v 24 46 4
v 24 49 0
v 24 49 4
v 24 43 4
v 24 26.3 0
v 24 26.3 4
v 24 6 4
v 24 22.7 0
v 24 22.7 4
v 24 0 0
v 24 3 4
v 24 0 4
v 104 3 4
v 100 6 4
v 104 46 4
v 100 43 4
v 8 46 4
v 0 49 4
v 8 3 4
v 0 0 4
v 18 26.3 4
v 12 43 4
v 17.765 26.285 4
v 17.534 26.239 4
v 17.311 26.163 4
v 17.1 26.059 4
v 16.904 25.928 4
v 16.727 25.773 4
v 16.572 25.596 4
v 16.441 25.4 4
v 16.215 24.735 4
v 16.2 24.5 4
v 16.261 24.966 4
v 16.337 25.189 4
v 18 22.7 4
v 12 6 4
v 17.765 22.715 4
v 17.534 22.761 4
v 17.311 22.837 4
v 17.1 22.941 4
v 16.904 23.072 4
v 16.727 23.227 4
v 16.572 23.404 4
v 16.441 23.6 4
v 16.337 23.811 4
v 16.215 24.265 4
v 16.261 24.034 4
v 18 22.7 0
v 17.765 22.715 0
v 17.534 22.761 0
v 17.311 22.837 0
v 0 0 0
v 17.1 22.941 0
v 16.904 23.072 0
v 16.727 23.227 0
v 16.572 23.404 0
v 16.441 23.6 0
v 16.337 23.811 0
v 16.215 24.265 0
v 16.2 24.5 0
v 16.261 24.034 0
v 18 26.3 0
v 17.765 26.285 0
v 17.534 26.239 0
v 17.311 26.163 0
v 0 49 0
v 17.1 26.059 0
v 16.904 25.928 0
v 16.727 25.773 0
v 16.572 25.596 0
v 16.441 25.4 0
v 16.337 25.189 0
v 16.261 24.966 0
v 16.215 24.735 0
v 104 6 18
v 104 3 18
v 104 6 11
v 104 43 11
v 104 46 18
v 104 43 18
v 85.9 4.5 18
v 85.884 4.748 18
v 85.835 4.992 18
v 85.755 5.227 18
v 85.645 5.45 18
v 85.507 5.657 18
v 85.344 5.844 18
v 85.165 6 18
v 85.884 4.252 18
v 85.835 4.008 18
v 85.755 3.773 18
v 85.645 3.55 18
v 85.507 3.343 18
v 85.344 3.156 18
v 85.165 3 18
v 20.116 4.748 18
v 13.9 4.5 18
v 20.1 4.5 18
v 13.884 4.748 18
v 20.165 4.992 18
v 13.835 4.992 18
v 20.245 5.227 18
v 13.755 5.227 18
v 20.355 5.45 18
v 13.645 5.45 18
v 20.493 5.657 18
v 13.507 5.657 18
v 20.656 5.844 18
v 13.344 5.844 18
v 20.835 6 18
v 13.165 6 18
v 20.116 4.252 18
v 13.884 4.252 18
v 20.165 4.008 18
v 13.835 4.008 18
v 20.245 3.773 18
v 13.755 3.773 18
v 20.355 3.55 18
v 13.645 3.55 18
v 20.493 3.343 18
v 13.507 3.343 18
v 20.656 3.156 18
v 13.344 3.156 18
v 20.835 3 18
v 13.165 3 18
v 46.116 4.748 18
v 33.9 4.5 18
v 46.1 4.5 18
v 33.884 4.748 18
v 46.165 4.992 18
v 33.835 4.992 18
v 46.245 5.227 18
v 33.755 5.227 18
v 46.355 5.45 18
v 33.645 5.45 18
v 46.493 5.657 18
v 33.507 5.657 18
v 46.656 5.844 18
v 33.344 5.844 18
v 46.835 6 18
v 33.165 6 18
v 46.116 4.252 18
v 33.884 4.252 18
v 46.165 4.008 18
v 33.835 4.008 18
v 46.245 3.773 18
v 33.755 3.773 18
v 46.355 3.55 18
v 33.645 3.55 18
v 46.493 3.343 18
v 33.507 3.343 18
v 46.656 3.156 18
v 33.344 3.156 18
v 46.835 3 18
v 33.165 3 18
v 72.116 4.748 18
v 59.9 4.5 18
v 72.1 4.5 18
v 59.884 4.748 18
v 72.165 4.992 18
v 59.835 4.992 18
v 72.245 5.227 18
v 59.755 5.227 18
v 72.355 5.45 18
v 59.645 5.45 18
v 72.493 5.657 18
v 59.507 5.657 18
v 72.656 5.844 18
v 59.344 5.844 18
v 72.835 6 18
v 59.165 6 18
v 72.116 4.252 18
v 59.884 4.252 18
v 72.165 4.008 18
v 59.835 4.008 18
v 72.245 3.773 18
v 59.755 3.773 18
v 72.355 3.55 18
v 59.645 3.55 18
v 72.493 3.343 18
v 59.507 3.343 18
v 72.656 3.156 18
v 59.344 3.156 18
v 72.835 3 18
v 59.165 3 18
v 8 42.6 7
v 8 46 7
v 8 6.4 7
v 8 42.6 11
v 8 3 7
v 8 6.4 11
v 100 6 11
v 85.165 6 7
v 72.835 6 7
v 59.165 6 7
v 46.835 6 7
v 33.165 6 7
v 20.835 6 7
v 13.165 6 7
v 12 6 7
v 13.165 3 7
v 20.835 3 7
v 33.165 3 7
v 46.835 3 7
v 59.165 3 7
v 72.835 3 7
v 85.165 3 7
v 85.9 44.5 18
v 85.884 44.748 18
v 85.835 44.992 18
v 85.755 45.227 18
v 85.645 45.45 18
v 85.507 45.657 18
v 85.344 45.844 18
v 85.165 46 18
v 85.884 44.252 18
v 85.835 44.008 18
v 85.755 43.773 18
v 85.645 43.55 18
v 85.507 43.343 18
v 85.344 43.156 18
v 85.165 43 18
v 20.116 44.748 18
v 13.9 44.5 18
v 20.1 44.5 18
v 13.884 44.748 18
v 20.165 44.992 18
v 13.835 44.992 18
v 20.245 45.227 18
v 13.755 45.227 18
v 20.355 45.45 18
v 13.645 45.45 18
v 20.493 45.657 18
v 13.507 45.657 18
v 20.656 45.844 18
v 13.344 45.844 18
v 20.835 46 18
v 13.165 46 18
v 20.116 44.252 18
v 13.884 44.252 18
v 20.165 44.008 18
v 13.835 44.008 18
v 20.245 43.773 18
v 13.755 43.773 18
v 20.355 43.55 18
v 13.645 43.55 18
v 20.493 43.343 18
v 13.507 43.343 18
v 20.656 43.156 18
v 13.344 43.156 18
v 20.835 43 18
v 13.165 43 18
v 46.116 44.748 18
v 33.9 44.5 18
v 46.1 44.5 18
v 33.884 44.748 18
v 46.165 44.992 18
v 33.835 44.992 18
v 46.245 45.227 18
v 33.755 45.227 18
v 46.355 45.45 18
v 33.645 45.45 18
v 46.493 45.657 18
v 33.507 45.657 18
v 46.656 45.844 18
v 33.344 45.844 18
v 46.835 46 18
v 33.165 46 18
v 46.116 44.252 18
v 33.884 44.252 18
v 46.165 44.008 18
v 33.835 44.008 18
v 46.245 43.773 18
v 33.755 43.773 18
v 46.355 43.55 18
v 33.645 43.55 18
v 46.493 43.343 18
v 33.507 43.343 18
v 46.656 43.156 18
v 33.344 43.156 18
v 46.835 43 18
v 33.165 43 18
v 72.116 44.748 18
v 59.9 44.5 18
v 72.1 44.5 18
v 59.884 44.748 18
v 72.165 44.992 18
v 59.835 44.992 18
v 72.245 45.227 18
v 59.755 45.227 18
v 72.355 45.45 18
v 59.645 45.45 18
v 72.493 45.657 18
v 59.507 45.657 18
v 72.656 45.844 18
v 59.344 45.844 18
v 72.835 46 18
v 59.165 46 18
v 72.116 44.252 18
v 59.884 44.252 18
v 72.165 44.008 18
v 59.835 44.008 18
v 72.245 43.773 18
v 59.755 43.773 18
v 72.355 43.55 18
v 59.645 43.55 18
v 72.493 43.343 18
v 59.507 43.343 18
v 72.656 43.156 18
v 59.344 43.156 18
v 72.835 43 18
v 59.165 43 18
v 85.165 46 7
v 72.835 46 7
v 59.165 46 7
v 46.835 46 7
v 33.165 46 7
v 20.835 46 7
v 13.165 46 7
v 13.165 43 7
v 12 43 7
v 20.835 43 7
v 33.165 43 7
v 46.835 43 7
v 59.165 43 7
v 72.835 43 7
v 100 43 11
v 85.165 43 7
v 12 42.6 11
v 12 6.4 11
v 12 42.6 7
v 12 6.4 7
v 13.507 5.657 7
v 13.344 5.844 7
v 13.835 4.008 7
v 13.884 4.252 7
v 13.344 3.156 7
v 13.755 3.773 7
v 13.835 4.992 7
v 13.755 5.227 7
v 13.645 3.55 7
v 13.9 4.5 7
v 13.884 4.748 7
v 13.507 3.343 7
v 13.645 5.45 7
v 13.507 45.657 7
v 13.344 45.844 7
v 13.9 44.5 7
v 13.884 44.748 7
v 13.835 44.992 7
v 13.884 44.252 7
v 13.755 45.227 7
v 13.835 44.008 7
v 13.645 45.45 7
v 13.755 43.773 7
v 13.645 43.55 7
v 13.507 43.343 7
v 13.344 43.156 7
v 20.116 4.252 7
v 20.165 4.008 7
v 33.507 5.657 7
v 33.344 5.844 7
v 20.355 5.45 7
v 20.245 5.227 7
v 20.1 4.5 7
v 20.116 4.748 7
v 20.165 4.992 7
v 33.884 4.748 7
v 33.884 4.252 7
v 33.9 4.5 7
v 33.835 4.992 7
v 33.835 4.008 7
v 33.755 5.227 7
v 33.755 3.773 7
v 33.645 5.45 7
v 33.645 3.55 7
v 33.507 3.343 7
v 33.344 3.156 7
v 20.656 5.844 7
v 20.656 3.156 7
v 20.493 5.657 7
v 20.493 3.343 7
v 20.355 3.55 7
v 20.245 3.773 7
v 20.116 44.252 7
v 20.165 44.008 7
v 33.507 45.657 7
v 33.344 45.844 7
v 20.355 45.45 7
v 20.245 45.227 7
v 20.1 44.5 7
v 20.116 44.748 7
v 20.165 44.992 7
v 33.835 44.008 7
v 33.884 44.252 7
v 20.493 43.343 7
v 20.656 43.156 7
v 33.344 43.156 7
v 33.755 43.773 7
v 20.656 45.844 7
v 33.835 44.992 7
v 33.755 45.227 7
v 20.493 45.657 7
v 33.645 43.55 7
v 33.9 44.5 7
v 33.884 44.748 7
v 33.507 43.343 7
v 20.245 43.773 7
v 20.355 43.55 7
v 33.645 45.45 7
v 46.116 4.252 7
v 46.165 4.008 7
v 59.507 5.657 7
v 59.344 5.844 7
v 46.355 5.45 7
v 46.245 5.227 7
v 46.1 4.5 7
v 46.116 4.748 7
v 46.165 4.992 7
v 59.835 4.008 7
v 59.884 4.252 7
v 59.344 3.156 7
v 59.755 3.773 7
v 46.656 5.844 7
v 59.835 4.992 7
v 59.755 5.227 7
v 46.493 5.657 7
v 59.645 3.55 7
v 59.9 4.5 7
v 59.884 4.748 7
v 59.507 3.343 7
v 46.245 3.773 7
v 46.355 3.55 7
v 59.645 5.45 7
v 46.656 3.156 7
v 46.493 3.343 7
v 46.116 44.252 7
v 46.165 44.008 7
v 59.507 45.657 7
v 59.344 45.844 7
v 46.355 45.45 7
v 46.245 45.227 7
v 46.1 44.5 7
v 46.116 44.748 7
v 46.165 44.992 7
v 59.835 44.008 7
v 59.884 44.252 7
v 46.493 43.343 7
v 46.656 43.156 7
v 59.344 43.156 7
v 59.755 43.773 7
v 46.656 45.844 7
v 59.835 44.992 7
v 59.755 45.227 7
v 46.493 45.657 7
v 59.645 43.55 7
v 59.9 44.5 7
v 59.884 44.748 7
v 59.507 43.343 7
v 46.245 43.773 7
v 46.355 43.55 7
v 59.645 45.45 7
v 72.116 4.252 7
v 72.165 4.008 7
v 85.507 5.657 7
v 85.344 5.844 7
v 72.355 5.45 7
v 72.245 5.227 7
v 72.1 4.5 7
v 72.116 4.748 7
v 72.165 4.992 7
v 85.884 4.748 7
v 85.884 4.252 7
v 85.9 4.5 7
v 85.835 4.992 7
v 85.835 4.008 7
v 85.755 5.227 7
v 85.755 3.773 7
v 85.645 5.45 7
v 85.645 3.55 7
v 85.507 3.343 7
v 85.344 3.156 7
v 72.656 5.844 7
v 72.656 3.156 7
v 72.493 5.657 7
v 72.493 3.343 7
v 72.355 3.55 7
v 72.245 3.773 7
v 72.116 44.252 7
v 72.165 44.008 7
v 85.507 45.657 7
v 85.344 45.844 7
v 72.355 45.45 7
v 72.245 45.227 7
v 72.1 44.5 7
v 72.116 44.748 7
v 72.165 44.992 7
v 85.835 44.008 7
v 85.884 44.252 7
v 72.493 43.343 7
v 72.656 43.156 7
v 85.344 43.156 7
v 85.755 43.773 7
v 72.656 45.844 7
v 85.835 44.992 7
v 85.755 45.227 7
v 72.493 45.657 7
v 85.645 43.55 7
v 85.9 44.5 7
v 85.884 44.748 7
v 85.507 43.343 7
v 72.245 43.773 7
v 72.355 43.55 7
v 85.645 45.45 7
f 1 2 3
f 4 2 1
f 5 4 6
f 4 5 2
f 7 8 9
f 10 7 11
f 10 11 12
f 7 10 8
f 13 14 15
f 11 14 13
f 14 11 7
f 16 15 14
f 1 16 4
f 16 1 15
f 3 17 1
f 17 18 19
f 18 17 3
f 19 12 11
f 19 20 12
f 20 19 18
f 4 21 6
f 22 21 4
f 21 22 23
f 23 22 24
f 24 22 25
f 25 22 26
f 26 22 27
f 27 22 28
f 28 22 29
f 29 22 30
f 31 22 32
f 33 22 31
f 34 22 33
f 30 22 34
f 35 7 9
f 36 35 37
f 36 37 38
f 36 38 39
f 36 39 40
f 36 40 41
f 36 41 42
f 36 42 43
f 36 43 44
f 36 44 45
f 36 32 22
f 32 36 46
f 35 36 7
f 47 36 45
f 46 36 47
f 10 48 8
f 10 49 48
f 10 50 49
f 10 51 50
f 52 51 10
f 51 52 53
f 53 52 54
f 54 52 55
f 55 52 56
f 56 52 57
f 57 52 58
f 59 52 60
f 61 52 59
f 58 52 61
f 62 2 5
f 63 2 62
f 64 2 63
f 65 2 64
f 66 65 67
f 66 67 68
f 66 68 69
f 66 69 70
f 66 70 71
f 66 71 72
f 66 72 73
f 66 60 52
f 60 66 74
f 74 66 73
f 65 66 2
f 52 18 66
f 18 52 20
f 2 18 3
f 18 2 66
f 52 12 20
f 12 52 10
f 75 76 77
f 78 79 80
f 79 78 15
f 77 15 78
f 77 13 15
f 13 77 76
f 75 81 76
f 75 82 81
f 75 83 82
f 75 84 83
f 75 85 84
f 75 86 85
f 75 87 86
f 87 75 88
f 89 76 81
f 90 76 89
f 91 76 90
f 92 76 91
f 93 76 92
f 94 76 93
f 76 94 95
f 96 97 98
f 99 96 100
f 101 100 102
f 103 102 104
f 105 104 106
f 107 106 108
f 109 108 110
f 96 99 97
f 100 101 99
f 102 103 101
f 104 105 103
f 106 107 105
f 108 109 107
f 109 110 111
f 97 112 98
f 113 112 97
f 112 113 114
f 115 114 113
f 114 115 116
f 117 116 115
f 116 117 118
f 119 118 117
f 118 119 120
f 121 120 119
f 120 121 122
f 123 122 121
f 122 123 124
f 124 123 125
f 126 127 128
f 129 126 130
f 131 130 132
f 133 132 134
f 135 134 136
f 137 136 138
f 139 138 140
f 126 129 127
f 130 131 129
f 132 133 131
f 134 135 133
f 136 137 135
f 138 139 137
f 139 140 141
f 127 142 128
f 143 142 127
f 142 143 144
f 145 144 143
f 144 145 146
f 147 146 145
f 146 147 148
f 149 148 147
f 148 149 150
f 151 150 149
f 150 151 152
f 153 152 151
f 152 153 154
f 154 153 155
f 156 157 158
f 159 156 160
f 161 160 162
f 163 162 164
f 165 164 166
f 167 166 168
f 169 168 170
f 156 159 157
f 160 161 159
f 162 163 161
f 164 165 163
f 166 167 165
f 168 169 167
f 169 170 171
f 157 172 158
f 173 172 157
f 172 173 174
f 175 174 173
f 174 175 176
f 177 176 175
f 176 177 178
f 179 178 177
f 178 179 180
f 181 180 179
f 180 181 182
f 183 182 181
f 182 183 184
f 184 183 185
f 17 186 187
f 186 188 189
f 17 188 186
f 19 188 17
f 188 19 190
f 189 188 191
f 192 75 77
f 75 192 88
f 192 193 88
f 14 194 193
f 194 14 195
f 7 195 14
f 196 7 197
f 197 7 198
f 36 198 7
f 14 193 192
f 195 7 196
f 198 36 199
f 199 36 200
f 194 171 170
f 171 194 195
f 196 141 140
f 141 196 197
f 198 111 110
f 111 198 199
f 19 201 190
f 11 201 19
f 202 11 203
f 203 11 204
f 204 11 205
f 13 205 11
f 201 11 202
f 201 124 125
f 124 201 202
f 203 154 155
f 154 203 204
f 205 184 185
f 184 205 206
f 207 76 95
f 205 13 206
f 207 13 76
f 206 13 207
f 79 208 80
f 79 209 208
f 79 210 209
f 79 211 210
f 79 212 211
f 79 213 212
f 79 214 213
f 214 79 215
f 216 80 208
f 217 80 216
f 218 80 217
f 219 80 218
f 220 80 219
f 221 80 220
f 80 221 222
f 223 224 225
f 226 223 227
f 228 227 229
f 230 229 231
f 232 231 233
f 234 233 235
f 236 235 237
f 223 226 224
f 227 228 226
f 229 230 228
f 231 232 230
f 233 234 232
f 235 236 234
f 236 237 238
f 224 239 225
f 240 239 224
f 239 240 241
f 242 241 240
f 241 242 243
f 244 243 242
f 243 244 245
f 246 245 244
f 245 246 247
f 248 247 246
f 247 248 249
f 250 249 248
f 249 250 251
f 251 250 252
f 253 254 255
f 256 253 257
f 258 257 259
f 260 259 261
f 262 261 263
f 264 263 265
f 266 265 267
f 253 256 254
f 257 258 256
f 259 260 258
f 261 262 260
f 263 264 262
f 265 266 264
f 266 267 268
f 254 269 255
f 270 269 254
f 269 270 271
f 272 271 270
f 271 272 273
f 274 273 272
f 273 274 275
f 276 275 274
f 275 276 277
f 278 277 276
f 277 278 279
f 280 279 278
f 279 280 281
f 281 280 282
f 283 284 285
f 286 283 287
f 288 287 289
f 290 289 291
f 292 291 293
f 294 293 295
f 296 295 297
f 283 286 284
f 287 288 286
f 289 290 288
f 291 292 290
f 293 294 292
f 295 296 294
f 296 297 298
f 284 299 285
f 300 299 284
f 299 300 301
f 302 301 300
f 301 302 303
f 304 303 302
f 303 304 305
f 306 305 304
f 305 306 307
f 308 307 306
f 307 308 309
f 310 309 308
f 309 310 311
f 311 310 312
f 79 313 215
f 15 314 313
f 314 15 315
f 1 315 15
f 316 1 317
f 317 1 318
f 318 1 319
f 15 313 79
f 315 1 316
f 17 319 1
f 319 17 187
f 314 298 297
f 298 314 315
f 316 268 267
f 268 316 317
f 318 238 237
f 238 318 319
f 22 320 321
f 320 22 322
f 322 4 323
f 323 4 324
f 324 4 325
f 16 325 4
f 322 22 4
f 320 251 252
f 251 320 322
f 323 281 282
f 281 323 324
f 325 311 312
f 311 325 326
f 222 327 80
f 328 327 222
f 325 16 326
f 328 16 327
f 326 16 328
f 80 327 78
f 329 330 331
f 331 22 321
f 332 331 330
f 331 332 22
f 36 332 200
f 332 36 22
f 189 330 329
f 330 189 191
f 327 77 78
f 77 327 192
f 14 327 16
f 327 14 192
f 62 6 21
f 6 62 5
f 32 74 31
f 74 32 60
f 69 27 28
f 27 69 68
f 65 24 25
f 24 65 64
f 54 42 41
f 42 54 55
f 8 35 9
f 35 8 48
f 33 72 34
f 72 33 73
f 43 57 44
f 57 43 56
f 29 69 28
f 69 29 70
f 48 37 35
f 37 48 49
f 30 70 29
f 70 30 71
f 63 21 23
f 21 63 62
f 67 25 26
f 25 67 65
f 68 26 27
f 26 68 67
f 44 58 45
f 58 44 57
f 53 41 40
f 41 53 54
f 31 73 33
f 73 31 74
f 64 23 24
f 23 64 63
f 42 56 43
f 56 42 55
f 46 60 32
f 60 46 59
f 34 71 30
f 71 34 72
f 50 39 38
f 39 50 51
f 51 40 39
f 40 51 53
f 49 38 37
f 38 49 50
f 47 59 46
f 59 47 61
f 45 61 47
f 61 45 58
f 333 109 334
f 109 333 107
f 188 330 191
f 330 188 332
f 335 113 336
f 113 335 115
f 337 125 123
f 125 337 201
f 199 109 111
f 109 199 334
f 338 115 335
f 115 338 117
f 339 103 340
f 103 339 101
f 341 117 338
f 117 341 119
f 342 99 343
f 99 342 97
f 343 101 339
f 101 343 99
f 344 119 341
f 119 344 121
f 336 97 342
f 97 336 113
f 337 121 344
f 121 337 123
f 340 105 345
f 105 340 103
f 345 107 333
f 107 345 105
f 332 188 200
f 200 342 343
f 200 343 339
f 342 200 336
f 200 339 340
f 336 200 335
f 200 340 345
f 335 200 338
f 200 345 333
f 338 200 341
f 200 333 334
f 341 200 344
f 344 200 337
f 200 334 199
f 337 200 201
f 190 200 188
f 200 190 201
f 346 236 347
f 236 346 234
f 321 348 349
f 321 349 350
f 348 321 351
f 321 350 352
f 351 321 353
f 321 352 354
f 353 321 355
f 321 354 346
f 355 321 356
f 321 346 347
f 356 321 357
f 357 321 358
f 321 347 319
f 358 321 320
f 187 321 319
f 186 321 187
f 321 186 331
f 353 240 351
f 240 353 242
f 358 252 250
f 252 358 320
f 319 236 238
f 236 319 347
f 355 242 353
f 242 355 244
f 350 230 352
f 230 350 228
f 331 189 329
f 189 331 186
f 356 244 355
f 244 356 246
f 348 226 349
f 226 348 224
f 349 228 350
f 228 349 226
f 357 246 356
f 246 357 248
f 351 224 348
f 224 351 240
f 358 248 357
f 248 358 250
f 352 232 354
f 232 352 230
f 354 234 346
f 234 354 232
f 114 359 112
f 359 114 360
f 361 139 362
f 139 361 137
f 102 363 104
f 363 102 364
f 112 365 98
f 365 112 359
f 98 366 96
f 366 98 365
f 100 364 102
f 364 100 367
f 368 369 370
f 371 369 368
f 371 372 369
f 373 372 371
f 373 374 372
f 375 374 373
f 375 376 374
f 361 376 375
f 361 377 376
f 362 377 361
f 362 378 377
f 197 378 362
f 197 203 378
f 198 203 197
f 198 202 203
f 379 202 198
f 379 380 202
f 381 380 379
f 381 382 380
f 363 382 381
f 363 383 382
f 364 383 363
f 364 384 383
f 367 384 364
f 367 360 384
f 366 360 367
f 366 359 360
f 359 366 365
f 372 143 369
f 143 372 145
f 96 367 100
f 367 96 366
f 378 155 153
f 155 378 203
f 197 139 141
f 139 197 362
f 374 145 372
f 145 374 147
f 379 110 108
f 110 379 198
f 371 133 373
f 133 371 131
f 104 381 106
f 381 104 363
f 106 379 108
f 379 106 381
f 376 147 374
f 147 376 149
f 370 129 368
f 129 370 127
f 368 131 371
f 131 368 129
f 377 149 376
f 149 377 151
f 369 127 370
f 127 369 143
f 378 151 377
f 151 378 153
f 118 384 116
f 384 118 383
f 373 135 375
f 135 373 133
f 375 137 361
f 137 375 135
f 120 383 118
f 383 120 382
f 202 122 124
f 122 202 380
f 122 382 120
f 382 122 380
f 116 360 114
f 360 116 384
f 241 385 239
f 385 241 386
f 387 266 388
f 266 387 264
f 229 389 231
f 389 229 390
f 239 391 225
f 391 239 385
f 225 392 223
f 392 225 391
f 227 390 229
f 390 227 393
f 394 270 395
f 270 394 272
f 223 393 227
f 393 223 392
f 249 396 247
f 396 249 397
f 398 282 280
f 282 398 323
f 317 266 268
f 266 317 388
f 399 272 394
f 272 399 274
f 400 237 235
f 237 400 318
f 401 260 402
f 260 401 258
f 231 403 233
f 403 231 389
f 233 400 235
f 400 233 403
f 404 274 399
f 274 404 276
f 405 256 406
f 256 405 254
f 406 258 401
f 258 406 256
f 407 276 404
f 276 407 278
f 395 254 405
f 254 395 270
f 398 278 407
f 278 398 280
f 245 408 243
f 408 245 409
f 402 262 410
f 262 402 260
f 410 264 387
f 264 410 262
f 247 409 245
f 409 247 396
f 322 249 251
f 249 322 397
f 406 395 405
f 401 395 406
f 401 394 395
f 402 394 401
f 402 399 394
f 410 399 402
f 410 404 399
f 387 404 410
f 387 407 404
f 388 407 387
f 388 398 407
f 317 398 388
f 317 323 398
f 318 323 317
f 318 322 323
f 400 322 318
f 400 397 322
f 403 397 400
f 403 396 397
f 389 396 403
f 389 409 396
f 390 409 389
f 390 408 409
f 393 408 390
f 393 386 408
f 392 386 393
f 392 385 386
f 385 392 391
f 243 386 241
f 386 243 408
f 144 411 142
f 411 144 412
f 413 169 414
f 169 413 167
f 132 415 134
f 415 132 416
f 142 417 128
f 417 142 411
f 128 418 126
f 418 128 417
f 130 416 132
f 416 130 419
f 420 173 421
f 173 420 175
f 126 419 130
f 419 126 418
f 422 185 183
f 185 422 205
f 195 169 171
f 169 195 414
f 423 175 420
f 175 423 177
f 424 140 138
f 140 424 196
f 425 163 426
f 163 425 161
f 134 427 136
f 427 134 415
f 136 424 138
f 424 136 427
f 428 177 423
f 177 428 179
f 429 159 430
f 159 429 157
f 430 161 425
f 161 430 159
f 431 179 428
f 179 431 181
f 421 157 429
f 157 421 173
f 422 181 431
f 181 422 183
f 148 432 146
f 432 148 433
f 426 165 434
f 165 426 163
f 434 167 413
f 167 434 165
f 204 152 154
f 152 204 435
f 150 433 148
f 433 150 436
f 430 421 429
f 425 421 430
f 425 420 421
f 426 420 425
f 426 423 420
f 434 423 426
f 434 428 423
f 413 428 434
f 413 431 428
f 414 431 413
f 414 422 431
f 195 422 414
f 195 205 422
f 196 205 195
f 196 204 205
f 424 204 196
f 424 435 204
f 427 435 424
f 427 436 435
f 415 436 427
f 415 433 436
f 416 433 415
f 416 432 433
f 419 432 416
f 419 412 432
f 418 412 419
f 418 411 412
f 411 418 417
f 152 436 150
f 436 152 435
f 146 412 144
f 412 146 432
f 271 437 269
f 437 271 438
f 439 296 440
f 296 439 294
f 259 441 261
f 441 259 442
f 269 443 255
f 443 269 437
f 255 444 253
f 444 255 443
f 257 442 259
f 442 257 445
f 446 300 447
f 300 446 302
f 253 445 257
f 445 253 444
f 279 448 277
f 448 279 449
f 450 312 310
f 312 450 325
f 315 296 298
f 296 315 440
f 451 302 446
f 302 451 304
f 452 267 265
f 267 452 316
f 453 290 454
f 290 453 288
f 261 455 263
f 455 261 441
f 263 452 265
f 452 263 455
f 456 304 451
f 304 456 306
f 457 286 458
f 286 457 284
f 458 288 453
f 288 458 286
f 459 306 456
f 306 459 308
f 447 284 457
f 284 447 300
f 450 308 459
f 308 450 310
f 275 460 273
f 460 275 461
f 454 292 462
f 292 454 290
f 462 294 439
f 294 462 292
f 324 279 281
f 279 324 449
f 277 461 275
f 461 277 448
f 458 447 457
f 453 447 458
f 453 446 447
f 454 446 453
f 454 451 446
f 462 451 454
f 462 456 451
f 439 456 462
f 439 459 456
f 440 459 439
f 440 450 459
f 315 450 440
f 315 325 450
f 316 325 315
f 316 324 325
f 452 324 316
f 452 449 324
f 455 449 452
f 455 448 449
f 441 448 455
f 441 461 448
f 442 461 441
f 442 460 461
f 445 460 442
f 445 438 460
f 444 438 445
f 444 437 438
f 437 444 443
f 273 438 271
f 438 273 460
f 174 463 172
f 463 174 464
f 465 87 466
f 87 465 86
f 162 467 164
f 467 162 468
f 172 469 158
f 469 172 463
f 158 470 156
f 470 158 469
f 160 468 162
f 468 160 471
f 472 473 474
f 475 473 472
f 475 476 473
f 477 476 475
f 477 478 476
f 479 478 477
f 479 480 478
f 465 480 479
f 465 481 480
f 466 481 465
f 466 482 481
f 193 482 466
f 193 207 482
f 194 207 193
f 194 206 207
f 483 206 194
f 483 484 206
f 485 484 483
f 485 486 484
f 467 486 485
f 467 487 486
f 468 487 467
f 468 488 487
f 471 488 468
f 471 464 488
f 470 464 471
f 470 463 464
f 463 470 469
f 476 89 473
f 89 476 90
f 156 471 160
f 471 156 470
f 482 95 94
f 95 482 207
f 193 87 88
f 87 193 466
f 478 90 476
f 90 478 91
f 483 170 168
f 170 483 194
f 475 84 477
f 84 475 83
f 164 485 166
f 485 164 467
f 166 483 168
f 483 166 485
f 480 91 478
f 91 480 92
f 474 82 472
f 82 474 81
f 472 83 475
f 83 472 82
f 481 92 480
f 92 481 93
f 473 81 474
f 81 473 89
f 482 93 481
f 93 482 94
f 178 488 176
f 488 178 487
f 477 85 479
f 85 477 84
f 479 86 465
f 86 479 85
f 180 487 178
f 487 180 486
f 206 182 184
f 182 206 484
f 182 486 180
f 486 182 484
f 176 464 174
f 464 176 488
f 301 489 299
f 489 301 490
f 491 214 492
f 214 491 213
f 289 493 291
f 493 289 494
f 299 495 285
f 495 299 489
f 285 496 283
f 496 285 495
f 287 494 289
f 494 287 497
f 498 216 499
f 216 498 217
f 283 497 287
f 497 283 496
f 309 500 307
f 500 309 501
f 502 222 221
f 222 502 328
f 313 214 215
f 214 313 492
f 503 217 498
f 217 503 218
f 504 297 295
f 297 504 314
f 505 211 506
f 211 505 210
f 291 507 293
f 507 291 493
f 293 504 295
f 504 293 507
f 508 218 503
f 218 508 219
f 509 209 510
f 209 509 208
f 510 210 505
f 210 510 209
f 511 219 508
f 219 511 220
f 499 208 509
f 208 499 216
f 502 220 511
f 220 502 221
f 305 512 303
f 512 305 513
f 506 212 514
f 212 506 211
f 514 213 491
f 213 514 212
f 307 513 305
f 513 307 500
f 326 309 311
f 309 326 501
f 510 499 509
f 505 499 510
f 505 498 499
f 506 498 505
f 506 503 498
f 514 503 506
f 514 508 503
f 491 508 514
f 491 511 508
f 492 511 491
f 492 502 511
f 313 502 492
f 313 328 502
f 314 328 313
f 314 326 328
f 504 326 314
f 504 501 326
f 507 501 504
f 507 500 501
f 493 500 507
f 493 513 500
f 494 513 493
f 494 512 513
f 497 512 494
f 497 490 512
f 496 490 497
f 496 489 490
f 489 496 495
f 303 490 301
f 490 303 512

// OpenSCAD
// Parametric front mount for an 8-channel gray sensor board.
// First version based on board size: 90.3 x 37.0 mm.
// Print in PETG or ABS, 0.4 mm nozzle, 4 perimeters, 30% infill.

$fn = 48;

// Board data from the image
board_len = 90.3;
board_w   = 37.0;
board_t   = 1.6;

// Clearances
clr = 0.6;
wall = 3.0;

// Frame sizes
frame_len = 112;
frame_w   = board_w + 2 * wall + 6;
frame_h   = 18;
top_t     = 4;

// Chassis mounting slots
slot_len = 16;
slot_w   = 3.6;
slot_x1  = 26;
slot_x2  = 78;

// Board retention slots for zip ties
tie_slot_len = 10;
tie_slot_w   = 3.8;
tie_z1 = 7;
tie_z2 = 27;
tie_z3 = 53;
tie_z4 = 79;

module oblong_cut(len, wid, h) {
    linear_extrude(height = h)
        hull() {
            translate([-len / 2, 0]) circle(d = wid);
            translate([ len / 2, 0]) circle(d = wid);
        }
}

module slot_at(x, y, z, len, wid, h, rot = 0) {
    translate([x, y, z])
        rotate([0, 0, rot])
            oblong_cut(len, wid, h);
}

module rail(x, y, h, t, l) {
    translate([x, y, top_t])
        cube([l, t, h]);
}

module sensor_mount() {
    difference() {
        union() {
            // rear chassis plate
            cube([24, frame_w, top_t]);

            // left and right side rails, leaving the bottom open
            rail(8, wall, frame_h - top_t, wall, frame_len - 16);
            rail(8, frame_w - 2 * wall, frame_h - top_t, wall, frame_len - 16);

            // front and rear stops for the board
            translate([8, wall, top_t])
                cube([4, frame_w - 2 * wall, 7]);
            translate([frame_len - 12, wall, top_t])
                cube([4, frame_w - 2 * wall, 7]);
        }

        // chassis slots
        slot_at(slot_x1, frame_w / 2, -0.1, slot_len, slot_w, top_t + 0.2);
        slot_at(slot_x2, frame_w / 2, -0.1, slot_len, slot_w, top_t + 0.2);

        // board tie slots, through both side rails
        slot_at(tie_z1, wall + wall / 2, top_t + 3, tie_slot_len, tie_slot_w, frame_h, 0);
        slot_at(tie_z1, frame_w - wall - wall / 2, top_t + 3, tie_slot_len, tie_slot_w, frame_h, 0);
        slot_at(tie_z2, wall + wall / 2, top_t + 3, tie_slot_len, tie_slot_w, frame_h, 0);
        slot_at(tie_z2, frame_w - wall - wall / 2, top_t + 3, tie_slot_len, tie_slot_w, frame_h, 0);
        slot_at(tie_z3, wall + wall / 2, top_t + 3, tie_slot_len, tie_slot_w, frame_h, 0);
        slot_at(tie_z3, frame_w - wall - wall / 2, top_t + 3, tie_slot_len, tie_slot_w, frame_h, 0);
        slot_at(tie_z4, wall + wall / 2, top_t + 3, tie_slot_len, tie_slot_w, frame_h, 0);
        slot_at(tie_z4, frame_w - wall - wall / 2, top_t + 3, tie_slot_len, tie_slot_w, frame_h, 0);

    }
}

sensor_mount();
